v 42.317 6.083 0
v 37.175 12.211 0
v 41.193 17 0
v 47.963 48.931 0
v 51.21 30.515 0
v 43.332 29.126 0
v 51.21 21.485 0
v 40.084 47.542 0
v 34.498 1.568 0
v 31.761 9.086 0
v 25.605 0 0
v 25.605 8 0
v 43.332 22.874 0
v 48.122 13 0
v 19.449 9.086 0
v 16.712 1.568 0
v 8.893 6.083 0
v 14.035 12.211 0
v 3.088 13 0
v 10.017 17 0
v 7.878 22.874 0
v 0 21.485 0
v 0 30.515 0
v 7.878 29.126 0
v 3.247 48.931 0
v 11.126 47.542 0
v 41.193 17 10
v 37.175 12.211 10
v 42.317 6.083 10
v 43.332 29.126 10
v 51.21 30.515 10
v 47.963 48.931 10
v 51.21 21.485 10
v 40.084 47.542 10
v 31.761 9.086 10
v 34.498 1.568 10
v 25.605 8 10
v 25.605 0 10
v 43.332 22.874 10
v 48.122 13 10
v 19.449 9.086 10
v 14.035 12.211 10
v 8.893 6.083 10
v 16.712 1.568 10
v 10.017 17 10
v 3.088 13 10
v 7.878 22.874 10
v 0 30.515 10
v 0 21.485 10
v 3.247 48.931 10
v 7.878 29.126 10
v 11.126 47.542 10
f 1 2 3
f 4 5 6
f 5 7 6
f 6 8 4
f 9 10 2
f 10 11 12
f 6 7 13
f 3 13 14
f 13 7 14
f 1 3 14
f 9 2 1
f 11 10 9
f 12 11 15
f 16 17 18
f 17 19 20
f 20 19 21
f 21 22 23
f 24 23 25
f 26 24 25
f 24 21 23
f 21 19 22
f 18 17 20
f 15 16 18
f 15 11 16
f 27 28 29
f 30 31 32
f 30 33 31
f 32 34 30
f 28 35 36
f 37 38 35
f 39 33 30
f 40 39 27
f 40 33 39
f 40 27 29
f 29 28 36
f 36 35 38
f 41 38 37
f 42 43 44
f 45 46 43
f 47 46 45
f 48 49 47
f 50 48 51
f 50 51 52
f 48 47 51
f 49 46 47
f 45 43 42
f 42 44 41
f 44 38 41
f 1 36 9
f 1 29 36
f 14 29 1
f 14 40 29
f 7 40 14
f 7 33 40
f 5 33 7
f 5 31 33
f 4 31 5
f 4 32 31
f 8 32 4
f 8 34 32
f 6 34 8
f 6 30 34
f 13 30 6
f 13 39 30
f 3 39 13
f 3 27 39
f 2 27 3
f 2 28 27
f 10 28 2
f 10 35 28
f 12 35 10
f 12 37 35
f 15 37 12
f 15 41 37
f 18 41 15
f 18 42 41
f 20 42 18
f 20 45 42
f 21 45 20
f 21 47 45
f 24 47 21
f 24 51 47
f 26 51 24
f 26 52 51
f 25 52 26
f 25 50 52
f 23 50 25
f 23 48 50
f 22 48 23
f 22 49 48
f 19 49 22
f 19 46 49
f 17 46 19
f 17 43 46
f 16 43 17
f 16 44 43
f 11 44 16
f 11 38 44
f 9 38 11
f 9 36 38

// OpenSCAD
$fn = 32;

// ----------------------------------------------------------------------
// Clip blank: omega clip, 10 mm thick
// ----------------------------------------------------------------------

// --- parameters (mm) ---
profile_height = 10;      // extrusion height
profile_points = 26;      // points of the closed outline

profile = [[0, 30.515], [0, 21.485], [3.088, 13], [8.893, 6.083], [16.712, 1.568], [25.605, 0], [34.498, 1.568], [42.317, 6.083], [48.122, 13], [51.21, 21.485], [51.21, 30.515], [47.963, 48.931], [40.084, 47.542], [43.332, 29.126], [43.332, 22.874], [41.193, 17], [37.175, 12.211], [31.761, 9.086], [25.605, 8], [19.449, 9.086], [14.035, 12.211], [10.017, 17], [7.878, 22.874], [7.878, 29.126], [11.126, 47.542], [3.247, 48.931]];  // single closed polygon, 26 points, counter clockwise

// --- the one profile operation ---
linear_extrude(height = profile_height) polygon(points = profile);
